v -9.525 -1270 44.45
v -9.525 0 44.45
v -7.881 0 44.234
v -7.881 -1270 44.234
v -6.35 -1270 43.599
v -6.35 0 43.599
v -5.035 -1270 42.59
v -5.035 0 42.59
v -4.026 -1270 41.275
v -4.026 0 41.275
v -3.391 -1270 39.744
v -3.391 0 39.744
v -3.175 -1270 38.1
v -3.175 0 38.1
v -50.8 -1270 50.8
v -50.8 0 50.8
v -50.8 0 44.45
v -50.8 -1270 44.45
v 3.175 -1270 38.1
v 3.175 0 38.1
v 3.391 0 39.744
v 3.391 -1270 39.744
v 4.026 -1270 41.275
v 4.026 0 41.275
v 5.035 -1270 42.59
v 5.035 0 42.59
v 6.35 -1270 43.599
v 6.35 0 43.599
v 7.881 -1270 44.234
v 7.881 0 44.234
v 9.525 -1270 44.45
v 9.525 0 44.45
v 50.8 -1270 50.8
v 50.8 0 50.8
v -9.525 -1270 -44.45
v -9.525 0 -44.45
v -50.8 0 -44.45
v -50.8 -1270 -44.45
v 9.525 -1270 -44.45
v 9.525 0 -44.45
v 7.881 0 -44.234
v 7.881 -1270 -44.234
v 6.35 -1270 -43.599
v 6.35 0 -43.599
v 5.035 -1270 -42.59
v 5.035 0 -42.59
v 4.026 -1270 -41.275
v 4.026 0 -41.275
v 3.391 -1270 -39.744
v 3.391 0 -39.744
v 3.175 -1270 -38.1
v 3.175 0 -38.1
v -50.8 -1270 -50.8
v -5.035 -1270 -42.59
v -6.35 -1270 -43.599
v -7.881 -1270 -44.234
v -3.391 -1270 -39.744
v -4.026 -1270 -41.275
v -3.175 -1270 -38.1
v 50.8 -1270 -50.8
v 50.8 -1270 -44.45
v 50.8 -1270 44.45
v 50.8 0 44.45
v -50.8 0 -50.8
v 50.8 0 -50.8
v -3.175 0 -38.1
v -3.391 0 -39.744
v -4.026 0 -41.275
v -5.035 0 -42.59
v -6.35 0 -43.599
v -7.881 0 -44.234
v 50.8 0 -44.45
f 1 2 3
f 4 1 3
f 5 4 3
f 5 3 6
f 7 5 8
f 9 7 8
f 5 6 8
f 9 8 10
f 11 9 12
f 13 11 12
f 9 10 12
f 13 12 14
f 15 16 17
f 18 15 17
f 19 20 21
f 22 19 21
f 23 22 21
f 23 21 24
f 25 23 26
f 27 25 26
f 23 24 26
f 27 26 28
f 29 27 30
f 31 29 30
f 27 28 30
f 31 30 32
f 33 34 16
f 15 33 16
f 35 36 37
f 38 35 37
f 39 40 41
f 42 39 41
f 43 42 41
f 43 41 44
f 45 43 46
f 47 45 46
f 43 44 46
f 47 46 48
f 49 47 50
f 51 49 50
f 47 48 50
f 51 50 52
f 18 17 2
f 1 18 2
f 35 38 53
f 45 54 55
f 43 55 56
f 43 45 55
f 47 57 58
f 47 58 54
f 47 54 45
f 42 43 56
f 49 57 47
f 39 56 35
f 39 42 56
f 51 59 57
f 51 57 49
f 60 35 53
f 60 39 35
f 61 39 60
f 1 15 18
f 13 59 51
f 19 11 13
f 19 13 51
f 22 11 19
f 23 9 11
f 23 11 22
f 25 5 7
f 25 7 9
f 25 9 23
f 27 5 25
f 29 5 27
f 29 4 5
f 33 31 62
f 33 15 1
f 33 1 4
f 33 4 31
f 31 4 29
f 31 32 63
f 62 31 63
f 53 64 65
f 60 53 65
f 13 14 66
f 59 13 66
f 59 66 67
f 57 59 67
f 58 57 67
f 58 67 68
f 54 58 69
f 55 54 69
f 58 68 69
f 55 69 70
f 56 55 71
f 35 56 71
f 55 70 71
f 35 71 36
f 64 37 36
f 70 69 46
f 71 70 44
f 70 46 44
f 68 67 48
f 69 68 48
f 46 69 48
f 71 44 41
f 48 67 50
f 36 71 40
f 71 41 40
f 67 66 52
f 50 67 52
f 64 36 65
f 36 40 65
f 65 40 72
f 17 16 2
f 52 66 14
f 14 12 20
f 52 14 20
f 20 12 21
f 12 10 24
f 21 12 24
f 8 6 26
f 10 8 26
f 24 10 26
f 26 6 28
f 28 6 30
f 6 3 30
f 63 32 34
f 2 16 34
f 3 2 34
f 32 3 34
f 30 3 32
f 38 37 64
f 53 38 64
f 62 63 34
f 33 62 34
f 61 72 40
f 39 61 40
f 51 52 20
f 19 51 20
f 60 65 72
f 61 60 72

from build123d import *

# Parameters (mm, degrees)
F1_DEPTH = 1270


with BuildPart() as f1:
    # F0 (on Front) → F1 (new body)
    with BuildSketch(Plane.XZ):
        with BuildLine():
            Line((50.8, 50.8), (0, 50.8))
            Line((0, 50.8), (-50.8, 50.8))
            Line((-50.8, 50.8), (-50.8, 44.45))
            Line((-50.8, 44.45), (-9.525, 44.45))
            ThreePointArc((-9.525, 44.45), (-5.034872, 42.590128), (-3.175, 38.1))
            Line((-3.175, 38.1), (-3.175, 0))
            Line((-3.175, 0), (-3.175, -38.1))
            ThreePointArc((-3.175, -38.1), (-5.034872, -42.590128), (-9.525, -44.45))
            Line((-9.525, -44.45), (-50.8, -44.45))
            Line((-50.8, -44.45), (-50.8, -50.8))
            Line((-50.8, -50.8), (0, -50.8))
            Line((0, -50.8), (50.8, -50.8))
            Line((50.8, -50.8), (50.8, -44.45))
            Line((50.8, -44.45), (9.525, -44.45))
            ThreePointArc((9.525, -44.45), (5.034872, -42.590128), (3.175, -38.1))
            Line((3.175, -38.1), (3.175, 0))
            Line((3.175, 0), (3.175, 38.1))
            ThreePointArc((3.175, 38.1), (5.034872, 42.590128), (9.525, 44.45))
            Line((9.525, 44.45), (50.8, 44.45))
            Line((50.8, 44.45), (50.8, 50.8))
        make_face()
    extrude(amount=F1_DEPTH)


solid = f1.part
